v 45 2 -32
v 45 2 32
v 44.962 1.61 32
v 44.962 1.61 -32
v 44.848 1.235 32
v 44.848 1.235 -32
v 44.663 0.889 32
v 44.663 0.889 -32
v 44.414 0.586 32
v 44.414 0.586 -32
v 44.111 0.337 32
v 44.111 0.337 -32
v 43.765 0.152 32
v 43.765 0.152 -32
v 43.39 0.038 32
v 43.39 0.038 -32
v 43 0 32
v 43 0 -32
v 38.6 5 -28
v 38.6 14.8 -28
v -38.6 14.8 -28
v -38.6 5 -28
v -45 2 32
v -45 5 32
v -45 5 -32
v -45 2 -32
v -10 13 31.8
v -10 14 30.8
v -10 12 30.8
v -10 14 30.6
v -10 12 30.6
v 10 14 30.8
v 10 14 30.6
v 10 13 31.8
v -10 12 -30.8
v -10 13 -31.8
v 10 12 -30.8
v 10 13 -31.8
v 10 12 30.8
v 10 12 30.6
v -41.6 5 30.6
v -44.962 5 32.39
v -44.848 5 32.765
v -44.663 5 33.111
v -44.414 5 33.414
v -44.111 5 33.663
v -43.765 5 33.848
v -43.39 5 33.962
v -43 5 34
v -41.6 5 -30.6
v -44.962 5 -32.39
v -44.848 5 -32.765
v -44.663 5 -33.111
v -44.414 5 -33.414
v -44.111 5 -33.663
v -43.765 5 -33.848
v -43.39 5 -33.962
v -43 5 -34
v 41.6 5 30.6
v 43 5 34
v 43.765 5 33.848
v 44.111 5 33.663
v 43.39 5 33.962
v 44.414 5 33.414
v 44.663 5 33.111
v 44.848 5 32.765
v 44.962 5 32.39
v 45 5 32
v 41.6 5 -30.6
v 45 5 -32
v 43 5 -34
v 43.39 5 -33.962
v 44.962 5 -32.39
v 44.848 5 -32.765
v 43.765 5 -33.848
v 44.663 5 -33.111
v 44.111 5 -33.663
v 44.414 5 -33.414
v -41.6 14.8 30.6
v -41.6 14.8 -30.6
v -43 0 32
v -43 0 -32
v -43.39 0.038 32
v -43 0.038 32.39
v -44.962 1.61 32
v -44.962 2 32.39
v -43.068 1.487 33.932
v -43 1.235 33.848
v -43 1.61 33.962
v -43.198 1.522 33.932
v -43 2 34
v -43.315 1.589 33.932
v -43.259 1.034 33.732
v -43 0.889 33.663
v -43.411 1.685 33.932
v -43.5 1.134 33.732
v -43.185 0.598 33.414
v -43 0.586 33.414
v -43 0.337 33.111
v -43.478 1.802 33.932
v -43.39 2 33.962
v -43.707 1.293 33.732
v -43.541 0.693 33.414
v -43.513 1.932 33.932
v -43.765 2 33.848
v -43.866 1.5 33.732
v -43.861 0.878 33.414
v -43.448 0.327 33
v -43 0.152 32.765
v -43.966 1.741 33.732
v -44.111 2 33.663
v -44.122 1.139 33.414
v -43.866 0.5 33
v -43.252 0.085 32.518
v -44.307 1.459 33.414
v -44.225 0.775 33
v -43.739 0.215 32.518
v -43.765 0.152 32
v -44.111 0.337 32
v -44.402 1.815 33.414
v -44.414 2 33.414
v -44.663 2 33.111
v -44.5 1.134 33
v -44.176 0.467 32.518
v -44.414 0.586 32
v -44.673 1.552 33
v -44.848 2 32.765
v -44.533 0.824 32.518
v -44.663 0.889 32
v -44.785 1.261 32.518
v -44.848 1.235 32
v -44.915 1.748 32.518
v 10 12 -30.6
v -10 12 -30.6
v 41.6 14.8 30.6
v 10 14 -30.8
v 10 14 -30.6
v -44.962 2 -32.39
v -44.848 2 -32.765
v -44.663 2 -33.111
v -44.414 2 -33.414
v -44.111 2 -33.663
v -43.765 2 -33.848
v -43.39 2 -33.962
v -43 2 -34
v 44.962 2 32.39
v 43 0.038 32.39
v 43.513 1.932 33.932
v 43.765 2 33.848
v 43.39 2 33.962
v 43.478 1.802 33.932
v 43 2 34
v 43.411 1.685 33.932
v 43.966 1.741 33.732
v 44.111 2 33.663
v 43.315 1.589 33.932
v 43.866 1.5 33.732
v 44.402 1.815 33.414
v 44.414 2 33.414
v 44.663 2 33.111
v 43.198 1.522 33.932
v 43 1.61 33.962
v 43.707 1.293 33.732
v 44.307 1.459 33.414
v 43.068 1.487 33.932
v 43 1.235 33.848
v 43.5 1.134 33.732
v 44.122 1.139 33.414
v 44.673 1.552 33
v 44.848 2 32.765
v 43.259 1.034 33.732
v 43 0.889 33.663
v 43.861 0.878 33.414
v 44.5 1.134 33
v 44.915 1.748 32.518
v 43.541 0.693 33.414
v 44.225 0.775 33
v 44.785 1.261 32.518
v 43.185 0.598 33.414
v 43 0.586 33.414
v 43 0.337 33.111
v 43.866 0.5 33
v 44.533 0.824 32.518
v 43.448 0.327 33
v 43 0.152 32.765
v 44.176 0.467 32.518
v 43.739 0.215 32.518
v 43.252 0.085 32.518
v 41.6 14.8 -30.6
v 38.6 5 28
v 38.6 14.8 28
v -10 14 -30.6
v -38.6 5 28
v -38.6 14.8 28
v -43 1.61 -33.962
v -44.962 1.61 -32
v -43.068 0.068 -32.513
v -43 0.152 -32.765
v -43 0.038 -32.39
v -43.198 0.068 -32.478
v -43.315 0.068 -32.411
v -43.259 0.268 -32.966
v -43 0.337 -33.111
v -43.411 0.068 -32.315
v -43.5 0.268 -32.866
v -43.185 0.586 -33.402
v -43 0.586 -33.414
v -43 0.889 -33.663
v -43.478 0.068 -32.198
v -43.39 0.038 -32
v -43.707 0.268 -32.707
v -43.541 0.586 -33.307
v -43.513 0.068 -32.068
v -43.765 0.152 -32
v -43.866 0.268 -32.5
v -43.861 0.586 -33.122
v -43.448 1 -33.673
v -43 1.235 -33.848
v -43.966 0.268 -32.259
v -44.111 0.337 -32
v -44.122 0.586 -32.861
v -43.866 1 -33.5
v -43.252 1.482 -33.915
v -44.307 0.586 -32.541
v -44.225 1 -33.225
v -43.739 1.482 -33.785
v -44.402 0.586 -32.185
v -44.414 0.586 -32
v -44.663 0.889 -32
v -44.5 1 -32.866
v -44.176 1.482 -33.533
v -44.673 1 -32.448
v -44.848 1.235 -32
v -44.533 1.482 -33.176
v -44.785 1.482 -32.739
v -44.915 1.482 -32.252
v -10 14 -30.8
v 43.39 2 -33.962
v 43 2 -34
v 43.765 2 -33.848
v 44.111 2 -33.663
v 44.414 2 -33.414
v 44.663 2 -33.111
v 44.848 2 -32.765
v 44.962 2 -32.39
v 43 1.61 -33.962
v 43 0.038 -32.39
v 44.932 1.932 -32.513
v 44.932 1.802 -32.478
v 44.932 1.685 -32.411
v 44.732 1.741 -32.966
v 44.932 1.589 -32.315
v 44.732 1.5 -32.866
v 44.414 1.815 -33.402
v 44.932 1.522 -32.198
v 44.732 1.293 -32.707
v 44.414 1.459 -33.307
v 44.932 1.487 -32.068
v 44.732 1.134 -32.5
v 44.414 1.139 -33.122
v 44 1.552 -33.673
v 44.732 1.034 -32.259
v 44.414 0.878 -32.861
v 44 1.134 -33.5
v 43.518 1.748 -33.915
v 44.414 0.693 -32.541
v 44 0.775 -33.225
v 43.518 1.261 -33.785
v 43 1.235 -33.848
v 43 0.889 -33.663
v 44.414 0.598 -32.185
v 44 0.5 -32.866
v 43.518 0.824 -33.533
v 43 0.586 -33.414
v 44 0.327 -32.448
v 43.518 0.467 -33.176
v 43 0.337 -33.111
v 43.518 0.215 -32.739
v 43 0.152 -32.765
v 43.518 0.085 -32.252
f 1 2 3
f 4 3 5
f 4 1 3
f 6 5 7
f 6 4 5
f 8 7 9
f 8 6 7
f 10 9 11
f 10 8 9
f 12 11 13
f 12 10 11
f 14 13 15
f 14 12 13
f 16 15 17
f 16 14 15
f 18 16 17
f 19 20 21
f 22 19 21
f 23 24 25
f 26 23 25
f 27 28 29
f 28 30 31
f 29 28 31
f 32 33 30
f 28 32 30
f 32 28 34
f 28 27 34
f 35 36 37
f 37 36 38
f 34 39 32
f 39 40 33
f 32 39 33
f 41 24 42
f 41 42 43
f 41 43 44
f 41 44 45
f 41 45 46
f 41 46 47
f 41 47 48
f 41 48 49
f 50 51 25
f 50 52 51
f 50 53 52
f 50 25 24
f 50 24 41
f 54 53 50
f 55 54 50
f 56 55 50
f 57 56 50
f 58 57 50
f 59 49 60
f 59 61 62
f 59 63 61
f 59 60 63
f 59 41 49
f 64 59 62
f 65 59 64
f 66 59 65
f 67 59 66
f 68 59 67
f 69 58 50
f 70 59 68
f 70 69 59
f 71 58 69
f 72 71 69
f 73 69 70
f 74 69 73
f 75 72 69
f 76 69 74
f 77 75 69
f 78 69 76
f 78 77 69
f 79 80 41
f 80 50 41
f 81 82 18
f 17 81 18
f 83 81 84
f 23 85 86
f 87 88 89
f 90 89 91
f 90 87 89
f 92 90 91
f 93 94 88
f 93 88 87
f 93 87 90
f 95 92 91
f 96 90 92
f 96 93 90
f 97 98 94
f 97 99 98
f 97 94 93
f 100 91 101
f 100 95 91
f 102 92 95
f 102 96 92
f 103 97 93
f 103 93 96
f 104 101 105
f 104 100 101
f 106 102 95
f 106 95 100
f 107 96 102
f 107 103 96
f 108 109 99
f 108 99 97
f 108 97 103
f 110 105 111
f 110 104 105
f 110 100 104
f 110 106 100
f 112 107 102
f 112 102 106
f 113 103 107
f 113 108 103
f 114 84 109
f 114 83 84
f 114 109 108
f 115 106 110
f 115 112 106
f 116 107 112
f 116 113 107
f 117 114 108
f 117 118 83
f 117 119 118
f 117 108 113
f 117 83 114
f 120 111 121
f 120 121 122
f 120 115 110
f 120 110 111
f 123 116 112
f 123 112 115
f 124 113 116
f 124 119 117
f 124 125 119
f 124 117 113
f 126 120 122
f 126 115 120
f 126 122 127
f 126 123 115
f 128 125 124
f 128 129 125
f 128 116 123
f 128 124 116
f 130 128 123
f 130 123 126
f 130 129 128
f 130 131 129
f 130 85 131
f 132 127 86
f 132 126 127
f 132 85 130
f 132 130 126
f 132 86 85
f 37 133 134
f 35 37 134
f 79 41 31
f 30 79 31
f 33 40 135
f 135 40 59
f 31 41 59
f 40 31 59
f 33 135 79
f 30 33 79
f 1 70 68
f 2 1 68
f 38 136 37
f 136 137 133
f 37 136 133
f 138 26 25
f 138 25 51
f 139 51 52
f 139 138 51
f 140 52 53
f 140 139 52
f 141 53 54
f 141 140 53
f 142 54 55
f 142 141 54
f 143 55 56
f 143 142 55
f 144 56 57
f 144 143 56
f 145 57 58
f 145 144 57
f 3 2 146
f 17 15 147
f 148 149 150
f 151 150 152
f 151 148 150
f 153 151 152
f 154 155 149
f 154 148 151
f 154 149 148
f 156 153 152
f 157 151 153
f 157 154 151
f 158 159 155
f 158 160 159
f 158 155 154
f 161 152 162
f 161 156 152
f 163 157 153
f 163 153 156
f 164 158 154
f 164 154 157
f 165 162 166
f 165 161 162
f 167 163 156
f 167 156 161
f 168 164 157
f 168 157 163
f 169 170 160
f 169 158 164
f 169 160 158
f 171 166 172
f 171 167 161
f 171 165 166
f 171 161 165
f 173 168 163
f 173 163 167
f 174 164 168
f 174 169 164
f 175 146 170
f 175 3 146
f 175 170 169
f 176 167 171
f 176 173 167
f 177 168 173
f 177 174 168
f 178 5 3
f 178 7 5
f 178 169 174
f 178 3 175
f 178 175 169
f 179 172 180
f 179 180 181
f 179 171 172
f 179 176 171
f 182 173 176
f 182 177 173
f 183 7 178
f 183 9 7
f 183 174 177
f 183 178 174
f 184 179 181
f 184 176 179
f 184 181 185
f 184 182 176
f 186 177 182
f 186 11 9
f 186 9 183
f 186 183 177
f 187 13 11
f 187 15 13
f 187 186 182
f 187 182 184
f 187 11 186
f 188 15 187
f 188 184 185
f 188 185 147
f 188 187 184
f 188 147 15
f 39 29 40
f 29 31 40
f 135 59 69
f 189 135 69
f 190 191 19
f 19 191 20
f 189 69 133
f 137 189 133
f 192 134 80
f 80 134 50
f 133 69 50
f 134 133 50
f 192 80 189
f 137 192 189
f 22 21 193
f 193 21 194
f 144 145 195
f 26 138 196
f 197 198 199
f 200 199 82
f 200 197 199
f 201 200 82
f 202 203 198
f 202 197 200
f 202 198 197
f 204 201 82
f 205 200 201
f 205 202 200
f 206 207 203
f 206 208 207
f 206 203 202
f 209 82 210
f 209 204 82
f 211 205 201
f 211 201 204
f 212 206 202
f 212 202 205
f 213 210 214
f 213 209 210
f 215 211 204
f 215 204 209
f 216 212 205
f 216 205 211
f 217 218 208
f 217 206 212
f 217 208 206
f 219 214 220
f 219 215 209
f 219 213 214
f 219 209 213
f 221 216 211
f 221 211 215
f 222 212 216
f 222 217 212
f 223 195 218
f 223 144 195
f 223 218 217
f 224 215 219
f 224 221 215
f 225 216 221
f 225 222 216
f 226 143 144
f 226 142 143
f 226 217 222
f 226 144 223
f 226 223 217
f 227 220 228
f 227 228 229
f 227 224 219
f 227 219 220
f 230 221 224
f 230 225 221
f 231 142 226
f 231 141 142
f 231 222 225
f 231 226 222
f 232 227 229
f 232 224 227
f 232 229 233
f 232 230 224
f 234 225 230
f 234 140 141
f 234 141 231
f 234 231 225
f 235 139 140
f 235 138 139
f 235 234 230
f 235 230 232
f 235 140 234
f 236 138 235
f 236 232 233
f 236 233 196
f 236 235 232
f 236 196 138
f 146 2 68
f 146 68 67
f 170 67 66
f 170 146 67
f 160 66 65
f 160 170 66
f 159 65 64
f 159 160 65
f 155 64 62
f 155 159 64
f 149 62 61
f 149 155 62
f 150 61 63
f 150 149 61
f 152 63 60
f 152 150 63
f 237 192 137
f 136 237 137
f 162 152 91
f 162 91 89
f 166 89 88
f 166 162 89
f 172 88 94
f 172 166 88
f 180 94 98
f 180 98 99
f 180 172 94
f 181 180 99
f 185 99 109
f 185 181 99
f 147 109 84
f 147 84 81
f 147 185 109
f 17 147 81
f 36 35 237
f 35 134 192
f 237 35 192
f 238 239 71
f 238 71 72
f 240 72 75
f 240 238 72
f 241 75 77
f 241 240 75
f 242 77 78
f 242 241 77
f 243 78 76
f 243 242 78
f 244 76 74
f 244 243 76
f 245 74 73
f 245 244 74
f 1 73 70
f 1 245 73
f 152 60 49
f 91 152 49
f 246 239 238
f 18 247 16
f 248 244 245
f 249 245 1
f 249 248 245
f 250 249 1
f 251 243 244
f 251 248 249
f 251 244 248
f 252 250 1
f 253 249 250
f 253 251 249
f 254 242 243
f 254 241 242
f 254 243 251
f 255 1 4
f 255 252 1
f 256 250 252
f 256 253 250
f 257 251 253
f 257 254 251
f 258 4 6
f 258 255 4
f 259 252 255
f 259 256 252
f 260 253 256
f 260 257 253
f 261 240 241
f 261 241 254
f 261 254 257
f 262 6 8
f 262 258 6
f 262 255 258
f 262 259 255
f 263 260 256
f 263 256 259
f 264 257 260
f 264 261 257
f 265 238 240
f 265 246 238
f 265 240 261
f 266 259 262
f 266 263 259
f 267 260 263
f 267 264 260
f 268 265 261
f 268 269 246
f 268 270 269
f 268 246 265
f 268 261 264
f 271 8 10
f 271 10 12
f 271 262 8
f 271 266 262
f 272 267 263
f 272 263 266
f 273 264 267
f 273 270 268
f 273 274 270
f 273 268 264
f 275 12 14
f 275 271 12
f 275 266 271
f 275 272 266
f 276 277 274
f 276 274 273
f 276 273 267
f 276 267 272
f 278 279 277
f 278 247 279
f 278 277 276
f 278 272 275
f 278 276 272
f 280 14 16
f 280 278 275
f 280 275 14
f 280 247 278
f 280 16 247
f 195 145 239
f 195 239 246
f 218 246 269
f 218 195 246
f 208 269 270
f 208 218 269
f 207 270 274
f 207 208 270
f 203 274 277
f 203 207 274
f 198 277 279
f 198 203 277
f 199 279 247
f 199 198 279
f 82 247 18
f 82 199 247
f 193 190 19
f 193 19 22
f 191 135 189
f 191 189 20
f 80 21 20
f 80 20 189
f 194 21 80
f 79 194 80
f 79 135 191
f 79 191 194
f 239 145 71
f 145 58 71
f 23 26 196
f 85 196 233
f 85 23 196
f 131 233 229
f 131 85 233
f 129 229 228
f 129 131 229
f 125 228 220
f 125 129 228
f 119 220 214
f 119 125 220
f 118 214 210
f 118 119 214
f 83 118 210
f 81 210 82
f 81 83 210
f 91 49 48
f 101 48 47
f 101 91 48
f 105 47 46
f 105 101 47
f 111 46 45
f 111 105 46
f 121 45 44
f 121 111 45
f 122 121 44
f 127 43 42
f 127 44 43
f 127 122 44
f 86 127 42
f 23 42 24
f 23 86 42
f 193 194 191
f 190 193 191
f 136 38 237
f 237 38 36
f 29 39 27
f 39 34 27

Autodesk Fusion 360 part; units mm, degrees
sketch "Sketch1" plane through (0, 0, 0) normal (0, 1, 0) x (1, 0, 0)
  line L0 (47, 36) -> (-47, 36)
  line L1 (-47, 36) -> (-47, -36)
  line L2 (-47, -36) -> (47, -36)
  line L3 (47, -36) -> (47, 36)
  line L4 (47, 36) -> (-47, -36) construction
  line L5 (-47, 36) -> (47, -36) construction
  dimension "d1" = 72
  dimension "d2" = 94
extrude "Extrude1" add sketch "Sketch1" along normal blind 5
sketch "Sketch2" plane through (0, 5, 0) normal (0, 1, 0) x (-1, 0, 0)
  line L0 (-47, 36) -> (-47, -36)
  line L1 (-47, -36) -> (47, -36)
  line L2 (47, -36) -> (47, 36)
  line L3 (47, 36) -> (-47, 36)
  line L4 (-41.6, -30.6) -> (41.6, -30.6)
  line L5 (41.6, -30.6) -> (41.6, 30.6)
  line L6 (41.6, 30.6) -> (-41.6, 30.6)
  line L7 (-41.6, 30.6) -> (-41.6, -30.6)
  line L8 (-41.6, -30.6) -> (41.6, 30.6) construction
  line L9 (41.6, -30.6) -> (-41.6, 30.6) construction
  dimension "d5" = 83.2
  dimension "d6" = 61.2
extrude "Extrude2" add sketch "Sketch2" along normal blind 9.8 contours L4 L5 L6 L7
fillet "Fillet1" radius 2 4 edges at (47, 2.5, -36) (47, 2.5, 36) (-47, 2.5, 36) (-47, 2.5, -36)
fillet "Fillet2" radius 2 8 edges at (0, 0, -36) (-46.4142, 0, -35.4142) (-47, 0, 0) (-46.4142, 0, 35.4142) (0, 0, 36) (46.4142, 0, 35.4142) (47, 0, 0) (46.4142, 0, -35.4142)
sketch "Sketch3" plane through (0, 14.8, 0) normal (0, 1, 0) x (-1, 0, 0)
  line L0 (-41.6, 30.6) -> (-41.6, -30.6)
  line L1 (-41.6, -30.6) -> (41.6, -30.6)
  line L2 (41.6, -30.6) -> (41.6, 30.6)
  line L3 (41.6, 30.6) -> (-41.6, 30.6)
  line L4 (-38.6, -28) -> (38.6, -28)
  line L5 (38.6, -28) -> (38.6, 28)
  line L6 (38.6, 28) -> (-38.6, 28)
  line L7 (-38.6, 28) -> (-38.6, -28)
  line L8 (-38.6, -28) -> (38.6, 28) construction
  line L9 (38.6, -28) -> (-38.6, 28) construction
  line L10 (-45, -34) -> (45, -34)
  dimension "d11" = 56
  dimension "d12" = 77.2
  dimension "d13" = 90
extrude "Extrude3" cut sketch "Sketch3" against normal blind 9.8 contours L4 L5 L6 L7
sketch "Sketch4" plane through (0, 0, -30.6) normal (0, 0, -1) x (-1, 0, 0)
  line L0 (-41.6, 5) -> (41.6, 5)
  line L1 (41.6, 5) -> (41.6, 14.8)
  line L2 (41.6, 14.8) -> (-41.6, 14.8)
  line L3 (-41.6, 14.8) -> (-41.6, 5)
  line L4 (10, 14) -> (-10, 14)
  line L5 (-10, 14) -> (-10, 12)
  line L6 (-10, 12) -> (10, 12)
  line L7 (10, 12) -> (10, 14)
  line L8 (10, 14) -> (-10, 12) construction
  line L9 (-10, 14) -> (10, 12) construction
  point P0 (0, 13)
  dimension "d16" = 20
  dimension "d17" = 2
extrude "Extrude4" add sketch "Sketch4" along normal blind 1.2 contours L4 L5 L6 L7
sketch "Sketch5" plane through (10, 0, 0) normal (1, 0, 0) x (0, 0, -1)
  line L0 (30.6, 14) -> (30.6, 12)
  line L1 (30.6, 12) -> (31.8, 12)
  line L2 (31.8, 12) -> (31.8, 14)
  line L3 (31.8, 14) -> (30.6, 14)
  point P0 (31.8, 14)
  point P1 (31.8, 12)
  point P2 (31.8, 12)
  point P3 (31.8, 12)
  point P4 (31.8, 12)
  point P5 (31.8, 12)
  point P6 (31.8, 14)
  point P7 (31.8, 14)
  point P8 (31.8, 14)
  point P9 (31.8, 14)
  point P10 (31.8, 14)
  point P11 (31.8, 14)
  point P12 (31.8, 14)
  point P13 (31.8, 14)
  point P14 (31.8, 14)
  point P15 (31.8, 14)
  point P16 (31.8, 12)
  point P17 (31.8, 14)
  point P18 (31.8, 12)
  point P19 (31.8, 14)
ref_plane "WorkPlane2" through (0, 9.9, 0) normal (0, 0, 1) x (-1, 0, 0)
ref_plane "WorkPlane1" through (0, 9.9, 30.6) normal (0, 0, 1) x (1, 0, 0)
ref_plane "WorkPlane3" through (0, 13, -26.8) normal (0, 0, -1) x (-1, 0, 0)
ref_plane "WorkPlane4" through (0, 13, -26.8) normal (0, 0, -1) x (-1, 0, 0)
mirror "Mirror1" about plane through (0, 9.9, 0) normal (0, 0, 1) of "Extrude4"
chamfer "Chamfer1" distance 1 angle 45 2 edges at (0, 14, 31.8) (0, 12, 31.8)
chamfer "Chamfer2" distance 1 angle 45 2 edges at (0, 14, -31.8) (0, 12, -31.8)
sketch "Sketch6" plane through (0, 14.8, 0) normal (0, 1, 0) x (-1, 0, 0)
  line L0 (38.6, -28) -> (-38.6, -28)
  line L1 (-38.6, -28) -> (-38.6, 28)
  line L2 (-38.6, 28) -> (38.6, 28)
  line L3 (38.6, 28) -> (38.6, -28)
  line L4 (-41.6, 30.6) -> (-41.6, -30.6)
  line L5 (-41.6, -30.6) -> (41.6, -30.6)
  line L6 (41.6, -30.6) -> (41.6, 30.6)
  line L7 (41.6, 30.6) -> (-41.6, 30.6)
  point P0 (42.1144, 28)
  point P1 (-41.6, 30.6)
sketch "Sketch7" plane through (0, 5, 0) normal (0, 1, 0) x (-1, 0, 0)
  arc A0 (45, -36) -> (47, -34) centre (45, -34) ccw
  line L0 (47, -34) -> (47, 34)
  arc A1 (47, 34) -> (45, 36) centre (45, 34) ccw
  line L1 (45, 36) -> (-45, 36)
  arc A2 (-45, 36) -> (-47, 34) centre (-45, 34) ccw
  line L2 (-47, 34) -> (-47, -34)
  arc A3 (-47, -34) -> (-45, -36) centre (-45, -34) ccw
  line L3 (-45, -36) -> (45, -36)
  line L4 (-41.6, 30.6) -> (41.6, 30.6)
  line L5 (41.6, 30.6) -> (41.6, -30.6)
  line L6 (41.6, -30.6) -> (-41.6, -30.6)
  line L7 (-41.6, -30.6) -> (-41.6, 30.6)
  line L8 (45, -34) -> (-45, -34)
  line L9 (-45, -34) -> (-45, 34)
  line L10 (-45, 34) -> (45, 34)
  line L11 (45, 34) -> (45, -34)
extrude "Extrude5" cut sketch "Sketch7" against normal blind 5 contours A0 L0 A1 L1 A2 L2 A3 L3
fillet "Fillet3" radius 2 8 edges at (-45, 2.5, -34) (0, 0, -34) (-45, 0, 0) (45, 2.5, -34) (45, 0, 0) (45, 2.5, 34) (0, 0, 34) (-45, 2.5, 34)
